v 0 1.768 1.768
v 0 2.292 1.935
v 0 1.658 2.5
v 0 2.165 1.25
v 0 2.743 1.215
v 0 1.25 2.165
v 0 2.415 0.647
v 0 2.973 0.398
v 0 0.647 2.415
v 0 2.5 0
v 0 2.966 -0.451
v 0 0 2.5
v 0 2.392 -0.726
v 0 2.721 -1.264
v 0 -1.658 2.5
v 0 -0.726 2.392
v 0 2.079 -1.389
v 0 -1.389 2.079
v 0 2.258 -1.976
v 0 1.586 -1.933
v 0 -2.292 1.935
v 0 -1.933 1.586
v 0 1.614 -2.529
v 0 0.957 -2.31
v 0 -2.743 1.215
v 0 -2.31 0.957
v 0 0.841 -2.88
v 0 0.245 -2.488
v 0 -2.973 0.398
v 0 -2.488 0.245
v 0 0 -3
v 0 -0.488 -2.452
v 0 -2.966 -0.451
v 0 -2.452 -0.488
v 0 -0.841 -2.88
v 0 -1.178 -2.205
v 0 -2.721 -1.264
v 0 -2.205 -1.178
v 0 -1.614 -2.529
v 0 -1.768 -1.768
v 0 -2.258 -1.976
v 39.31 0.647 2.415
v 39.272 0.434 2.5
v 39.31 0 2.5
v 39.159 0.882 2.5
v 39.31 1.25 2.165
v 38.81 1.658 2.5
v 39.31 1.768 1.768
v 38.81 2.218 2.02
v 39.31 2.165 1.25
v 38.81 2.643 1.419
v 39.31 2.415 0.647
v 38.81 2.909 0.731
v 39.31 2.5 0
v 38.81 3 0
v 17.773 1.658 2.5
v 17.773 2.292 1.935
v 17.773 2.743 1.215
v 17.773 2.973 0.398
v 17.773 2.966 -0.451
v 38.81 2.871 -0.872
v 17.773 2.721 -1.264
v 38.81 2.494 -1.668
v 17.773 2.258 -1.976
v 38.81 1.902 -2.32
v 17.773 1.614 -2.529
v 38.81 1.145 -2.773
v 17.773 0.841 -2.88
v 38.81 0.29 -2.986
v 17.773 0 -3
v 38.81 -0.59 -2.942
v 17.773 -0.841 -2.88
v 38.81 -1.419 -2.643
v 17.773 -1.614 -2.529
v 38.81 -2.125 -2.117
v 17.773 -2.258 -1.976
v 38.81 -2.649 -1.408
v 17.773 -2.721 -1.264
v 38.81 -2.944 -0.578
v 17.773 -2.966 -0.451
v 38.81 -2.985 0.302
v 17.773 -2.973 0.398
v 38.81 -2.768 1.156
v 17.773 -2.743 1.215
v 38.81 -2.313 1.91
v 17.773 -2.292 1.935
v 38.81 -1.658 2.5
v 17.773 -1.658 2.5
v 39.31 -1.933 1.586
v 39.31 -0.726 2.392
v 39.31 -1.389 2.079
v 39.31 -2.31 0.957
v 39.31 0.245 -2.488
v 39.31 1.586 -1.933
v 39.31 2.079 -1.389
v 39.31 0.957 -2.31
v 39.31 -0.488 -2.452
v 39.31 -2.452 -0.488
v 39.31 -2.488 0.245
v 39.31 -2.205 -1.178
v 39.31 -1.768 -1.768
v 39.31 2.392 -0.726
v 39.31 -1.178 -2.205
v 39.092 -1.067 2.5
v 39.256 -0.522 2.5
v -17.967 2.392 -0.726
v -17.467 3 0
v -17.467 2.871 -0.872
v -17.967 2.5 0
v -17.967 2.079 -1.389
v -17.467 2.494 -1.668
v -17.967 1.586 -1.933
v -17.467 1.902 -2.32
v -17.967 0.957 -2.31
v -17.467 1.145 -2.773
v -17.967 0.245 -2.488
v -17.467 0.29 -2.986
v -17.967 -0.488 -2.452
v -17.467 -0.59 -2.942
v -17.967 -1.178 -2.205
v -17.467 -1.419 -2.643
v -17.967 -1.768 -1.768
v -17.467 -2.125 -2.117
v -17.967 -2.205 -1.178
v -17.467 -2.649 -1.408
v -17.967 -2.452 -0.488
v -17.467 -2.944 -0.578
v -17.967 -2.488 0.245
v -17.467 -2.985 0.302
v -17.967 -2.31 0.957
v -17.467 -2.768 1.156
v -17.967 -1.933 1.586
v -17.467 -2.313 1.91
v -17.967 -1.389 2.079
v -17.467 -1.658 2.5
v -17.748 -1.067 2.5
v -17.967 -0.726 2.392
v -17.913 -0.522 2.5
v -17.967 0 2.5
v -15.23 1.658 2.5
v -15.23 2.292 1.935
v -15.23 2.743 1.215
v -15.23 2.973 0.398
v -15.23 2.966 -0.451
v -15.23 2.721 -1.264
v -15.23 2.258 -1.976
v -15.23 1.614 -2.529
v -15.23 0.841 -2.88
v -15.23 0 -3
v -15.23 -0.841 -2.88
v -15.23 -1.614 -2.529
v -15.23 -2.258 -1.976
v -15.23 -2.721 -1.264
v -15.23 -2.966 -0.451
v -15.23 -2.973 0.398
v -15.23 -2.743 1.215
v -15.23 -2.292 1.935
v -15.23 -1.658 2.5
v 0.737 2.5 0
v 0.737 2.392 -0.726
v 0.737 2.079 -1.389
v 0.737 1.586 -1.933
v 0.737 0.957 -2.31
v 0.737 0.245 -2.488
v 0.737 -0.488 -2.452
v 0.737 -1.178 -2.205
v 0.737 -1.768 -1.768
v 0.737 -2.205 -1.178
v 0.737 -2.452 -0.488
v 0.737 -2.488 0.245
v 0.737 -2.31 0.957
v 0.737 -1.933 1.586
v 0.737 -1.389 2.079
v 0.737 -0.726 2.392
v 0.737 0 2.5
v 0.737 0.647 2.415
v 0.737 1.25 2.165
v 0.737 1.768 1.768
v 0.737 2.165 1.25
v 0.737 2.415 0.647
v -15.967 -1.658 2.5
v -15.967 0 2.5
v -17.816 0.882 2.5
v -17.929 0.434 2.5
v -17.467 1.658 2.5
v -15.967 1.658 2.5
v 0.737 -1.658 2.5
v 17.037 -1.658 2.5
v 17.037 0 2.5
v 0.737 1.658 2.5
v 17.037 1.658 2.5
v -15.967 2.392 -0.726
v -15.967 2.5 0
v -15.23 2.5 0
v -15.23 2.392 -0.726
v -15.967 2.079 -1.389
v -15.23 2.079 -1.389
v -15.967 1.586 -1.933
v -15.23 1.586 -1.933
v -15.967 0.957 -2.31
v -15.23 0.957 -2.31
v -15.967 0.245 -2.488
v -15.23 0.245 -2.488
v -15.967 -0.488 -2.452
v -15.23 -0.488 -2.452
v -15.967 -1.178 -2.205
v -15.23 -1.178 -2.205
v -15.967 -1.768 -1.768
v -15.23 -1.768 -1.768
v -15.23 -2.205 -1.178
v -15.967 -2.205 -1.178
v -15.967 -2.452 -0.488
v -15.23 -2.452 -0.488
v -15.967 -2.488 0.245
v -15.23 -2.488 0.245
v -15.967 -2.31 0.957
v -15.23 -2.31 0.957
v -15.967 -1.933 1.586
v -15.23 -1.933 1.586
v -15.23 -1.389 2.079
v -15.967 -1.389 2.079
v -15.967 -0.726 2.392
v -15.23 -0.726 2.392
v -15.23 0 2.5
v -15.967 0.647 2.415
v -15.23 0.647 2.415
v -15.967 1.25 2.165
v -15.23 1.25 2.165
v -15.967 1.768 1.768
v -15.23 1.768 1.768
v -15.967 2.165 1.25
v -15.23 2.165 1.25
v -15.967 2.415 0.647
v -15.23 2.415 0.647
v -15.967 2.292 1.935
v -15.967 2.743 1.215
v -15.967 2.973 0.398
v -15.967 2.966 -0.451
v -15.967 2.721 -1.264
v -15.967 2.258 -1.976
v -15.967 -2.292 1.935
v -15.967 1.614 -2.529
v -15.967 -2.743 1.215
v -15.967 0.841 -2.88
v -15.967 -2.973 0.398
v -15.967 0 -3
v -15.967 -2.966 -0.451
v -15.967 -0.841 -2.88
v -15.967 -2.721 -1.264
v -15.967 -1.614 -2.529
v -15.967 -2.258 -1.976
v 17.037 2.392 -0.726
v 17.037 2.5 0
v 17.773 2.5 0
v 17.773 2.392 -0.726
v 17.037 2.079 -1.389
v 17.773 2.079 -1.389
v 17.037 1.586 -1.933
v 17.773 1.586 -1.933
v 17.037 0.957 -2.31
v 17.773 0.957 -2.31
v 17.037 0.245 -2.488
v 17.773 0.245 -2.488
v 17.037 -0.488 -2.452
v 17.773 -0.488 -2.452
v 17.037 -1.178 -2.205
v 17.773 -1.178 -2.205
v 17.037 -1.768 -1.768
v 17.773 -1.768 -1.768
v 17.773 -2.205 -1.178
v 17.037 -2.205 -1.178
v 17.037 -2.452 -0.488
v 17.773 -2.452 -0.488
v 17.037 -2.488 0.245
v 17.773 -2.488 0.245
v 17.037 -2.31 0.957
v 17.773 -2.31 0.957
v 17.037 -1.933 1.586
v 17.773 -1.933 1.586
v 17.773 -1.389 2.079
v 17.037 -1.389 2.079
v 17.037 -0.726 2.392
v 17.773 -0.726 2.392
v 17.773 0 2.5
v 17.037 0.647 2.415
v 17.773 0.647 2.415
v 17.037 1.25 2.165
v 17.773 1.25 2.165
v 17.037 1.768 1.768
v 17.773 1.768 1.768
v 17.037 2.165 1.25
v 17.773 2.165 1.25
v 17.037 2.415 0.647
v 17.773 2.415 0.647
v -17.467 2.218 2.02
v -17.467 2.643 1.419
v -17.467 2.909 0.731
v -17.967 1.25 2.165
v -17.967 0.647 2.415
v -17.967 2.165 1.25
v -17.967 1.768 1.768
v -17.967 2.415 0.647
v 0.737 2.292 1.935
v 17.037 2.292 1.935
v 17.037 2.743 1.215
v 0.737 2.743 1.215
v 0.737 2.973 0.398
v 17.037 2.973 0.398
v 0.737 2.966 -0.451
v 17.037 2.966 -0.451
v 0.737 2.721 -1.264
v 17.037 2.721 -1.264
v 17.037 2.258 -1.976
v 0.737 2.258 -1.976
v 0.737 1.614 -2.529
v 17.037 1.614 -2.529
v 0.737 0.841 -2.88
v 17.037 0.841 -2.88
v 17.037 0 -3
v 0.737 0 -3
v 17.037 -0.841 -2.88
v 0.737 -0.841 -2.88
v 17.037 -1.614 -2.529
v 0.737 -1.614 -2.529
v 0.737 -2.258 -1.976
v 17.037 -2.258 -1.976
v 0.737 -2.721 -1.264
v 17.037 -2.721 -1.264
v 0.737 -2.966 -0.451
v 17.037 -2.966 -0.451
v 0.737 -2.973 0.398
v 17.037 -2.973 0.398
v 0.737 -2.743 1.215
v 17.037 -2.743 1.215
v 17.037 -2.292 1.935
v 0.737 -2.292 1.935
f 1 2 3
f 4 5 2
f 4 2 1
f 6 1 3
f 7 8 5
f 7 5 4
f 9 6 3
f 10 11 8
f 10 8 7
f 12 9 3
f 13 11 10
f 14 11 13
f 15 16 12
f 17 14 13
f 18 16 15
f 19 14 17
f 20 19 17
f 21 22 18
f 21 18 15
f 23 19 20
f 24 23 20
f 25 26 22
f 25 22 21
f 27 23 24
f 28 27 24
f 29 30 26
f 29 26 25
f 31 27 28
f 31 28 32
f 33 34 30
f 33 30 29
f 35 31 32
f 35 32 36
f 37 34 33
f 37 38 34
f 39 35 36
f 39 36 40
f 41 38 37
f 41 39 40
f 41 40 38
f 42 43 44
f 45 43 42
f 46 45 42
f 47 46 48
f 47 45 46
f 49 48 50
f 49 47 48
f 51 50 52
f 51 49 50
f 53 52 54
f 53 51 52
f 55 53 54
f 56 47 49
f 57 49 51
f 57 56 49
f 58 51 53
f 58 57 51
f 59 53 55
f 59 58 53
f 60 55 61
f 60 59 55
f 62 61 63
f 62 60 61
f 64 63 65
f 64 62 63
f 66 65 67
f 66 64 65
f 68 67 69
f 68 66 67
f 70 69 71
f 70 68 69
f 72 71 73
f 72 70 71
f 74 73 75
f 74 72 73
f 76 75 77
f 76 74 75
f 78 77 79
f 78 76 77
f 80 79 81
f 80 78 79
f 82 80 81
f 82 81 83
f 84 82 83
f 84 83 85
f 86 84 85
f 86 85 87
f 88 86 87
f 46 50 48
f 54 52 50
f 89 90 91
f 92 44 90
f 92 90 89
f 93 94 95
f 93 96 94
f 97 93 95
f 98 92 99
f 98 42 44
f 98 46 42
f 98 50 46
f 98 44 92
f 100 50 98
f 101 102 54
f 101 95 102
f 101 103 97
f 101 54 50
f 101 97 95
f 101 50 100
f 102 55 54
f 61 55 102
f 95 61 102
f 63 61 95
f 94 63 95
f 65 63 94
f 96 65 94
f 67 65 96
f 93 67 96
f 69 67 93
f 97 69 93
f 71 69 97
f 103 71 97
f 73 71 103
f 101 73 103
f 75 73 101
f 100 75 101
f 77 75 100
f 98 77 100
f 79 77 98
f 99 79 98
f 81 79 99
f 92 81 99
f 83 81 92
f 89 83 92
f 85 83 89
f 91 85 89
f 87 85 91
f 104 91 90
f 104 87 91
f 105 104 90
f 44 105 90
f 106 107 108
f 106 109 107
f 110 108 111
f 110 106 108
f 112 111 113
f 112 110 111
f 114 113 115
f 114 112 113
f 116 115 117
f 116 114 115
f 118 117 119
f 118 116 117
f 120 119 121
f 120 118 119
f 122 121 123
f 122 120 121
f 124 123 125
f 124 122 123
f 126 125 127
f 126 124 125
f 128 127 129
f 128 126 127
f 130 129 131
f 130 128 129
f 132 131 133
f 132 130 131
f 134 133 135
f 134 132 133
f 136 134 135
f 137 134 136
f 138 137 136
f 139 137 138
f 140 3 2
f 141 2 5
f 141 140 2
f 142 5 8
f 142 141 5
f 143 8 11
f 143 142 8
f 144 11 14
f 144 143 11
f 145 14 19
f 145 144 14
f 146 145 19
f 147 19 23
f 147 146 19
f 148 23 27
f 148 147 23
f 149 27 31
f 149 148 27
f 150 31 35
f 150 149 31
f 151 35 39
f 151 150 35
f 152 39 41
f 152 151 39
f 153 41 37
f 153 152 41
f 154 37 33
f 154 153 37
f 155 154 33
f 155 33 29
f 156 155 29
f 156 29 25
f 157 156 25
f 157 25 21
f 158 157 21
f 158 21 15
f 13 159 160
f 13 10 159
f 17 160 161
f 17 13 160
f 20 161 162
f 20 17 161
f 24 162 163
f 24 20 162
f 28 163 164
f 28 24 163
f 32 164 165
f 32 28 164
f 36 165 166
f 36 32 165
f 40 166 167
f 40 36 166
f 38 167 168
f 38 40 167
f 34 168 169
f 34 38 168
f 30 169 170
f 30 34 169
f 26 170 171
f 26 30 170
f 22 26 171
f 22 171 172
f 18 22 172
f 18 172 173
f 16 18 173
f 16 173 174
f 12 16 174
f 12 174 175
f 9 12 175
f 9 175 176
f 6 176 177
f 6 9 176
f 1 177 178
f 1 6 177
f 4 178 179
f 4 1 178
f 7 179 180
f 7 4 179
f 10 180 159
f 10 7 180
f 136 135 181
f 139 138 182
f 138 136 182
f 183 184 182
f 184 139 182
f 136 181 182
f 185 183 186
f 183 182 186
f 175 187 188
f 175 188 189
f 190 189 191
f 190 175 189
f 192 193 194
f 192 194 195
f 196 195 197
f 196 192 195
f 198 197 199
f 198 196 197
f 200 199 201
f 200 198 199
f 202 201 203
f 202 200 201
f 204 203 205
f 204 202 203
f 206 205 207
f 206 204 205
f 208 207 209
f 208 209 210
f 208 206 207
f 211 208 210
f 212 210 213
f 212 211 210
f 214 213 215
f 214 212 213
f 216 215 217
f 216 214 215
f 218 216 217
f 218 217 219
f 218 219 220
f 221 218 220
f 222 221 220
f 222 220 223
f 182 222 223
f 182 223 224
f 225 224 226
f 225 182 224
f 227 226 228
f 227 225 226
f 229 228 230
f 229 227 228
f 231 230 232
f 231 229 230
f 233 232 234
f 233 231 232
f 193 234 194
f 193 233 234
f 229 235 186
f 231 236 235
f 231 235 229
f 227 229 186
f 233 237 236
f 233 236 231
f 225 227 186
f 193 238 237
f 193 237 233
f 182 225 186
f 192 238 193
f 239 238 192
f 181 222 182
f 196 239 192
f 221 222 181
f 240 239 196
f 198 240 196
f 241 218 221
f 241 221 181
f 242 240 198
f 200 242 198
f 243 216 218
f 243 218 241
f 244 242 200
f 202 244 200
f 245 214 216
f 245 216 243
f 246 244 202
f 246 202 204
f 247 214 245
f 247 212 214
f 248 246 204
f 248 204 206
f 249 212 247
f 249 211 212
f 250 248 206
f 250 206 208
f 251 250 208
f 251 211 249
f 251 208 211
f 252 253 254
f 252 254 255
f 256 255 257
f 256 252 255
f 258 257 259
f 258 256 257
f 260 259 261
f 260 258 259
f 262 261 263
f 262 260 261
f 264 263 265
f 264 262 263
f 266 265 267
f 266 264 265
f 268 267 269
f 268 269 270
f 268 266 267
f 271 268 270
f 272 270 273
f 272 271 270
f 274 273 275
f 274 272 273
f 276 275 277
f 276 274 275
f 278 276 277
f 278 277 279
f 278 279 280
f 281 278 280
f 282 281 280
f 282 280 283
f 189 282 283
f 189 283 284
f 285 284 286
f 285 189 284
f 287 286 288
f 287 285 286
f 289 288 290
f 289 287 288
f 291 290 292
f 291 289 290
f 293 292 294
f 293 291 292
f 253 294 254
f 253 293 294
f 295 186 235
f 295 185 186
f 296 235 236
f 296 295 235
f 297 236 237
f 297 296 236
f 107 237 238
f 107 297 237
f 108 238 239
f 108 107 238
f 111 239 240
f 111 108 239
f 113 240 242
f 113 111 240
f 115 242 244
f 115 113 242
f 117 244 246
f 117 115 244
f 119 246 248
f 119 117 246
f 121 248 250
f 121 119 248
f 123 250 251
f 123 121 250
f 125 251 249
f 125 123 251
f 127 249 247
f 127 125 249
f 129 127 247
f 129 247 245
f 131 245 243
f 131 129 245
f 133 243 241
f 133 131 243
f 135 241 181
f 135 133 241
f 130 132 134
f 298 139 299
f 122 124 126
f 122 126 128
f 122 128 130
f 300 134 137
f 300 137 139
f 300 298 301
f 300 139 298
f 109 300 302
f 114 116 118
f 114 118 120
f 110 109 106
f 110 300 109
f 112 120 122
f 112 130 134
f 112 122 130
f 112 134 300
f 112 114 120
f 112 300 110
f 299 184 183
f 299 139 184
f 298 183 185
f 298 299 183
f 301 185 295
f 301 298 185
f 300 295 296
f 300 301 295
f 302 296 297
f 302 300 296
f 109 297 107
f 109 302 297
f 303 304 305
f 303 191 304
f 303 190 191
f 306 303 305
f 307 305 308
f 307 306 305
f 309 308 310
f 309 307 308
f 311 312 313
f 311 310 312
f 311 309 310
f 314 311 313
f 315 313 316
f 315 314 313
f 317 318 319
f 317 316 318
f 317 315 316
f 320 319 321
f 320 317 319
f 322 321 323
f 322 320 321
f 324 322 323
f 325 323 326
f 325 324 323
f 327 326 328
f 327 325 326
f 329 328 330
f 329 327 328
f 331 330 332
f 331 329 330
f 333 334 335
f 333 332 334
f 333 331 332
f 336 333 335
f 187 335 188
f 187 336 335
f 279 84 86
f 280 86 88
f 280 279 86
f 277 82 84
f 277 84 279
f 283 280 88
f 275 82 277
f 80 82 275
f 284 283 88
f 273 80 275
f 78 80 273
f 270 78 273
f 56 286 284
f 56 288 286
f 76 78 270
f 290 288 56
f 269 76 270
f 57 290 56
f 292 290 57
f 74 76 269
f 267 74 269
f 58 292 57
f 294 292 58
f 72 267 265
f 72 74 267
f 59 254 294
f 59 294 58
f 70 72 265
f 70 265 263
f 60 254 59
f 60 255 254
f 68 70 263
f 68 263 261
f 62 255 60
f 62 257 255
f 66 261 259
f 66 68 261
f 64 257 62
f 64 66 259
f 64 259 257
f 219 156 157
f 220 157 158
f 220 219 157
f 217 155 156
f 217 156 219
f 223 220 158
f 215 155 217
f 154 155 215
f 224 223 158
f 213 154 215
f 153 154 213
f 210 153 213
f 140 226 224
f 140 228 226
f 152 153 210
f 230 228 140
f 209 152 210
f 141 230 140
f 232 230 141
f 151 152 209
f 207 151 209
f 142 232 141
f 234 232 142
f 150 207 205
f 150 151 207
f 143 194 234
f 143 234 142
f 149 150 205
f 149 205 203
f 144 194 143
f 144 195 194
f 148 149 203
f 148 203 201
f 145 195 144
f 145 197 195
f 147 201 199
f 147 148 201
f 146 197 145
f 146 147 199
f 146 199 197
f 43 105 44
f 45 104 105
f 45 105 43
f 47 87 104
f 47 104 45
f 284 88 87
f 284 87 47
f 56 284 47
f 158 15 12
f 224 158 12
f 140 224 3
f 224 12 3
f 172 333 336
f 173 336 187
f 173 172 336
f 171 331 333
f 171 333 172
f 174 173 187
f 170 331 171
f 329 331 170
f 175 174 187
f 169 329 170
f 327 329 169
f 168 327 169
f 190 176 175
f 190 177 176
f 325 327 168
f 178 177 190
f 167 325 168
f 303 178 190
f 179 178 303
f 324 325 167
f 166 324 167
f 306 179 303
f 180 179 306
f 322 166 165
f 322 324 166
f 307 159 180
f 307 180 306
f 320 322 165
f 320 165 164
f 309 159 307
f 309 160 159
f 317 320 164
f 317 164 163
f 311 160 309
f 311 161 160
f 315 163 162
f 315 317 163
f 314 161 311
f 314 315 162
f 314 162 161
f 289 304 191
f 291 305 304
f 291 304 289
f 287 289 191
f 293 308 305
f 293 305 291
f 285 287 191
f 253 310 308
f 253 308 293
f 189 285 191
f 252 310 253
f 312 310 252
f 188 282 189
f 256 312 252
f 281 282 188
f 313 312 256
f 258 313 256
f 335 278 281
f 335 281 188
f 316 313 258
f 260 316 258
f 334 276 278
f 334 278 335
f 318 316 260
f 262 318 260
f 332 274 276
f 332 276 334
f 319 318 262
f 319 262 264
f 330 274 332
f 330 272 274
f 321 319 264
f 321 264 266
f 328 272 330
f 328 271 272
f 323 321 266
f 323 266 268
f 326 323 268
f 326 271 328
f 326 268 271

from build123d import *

# Parameters (mm, degrees)
CHAMFER1_SIZE           = 0.5
CUT_EXTRUDE1_DEPTH      = 40.538087663
CUT_EXTRUDE1_DEPTH_BACK = 40.538087663
SKETCH2_W               = 2
SKETCH2_H               = 6


with BuildPart() as part:
    # Sketch1 → Revolve1 (revolve)
    with BuildSketch(Plane.XY):
        Polygon((-17.9666, 0), (39.3098, 0), (39.3098, 3), (37.3098, 3), (36.5732, 3), (17.7732, 3), (17.7732, 2.5), (17.0366, 2.5), (17.0366, 3), (0.7366, 3), (0.7366, 2.5), (0, 2.5), (0, 3), (-15.23, 3), (-15.23, 2.5), (-15.9666, 2.5), (-15.9666, 3), (-17.9666, 3), align=None)
    revolve(axis=Axis((-17.9666, 0, 0), (-1, 0, 0)))

    # Chamfer1
    chamfer1_edges = [part.edges().sort_by_distance(p)[0] for p in [
        (39.3098, -3, 0),
        (-17.9666, -3, 0),
    ]]
    chamfer(chamfer1_edges, length=CHAMFER1_SIZE)

    # Sketch2 → Cut-Extrude1 (cut, two sides: drawn at the far end of the back side and taken through both)
    with BuildSketch(Plane(origin=(0, 0, 0), x_dir=(0, 0, -1), z_dir=(1, 0, 0)).offset(-CUT_EXTRUDE1_DEPTH_BACK)):
        with Locations((-3.5, 0)):
            Rectangle(SKETCH2_W, SKETCH2_H)
    extrude(amount=CUT_EXTRUDE1_DEPTH + CUT_EXTRUDE1_DEPTH_BACK, mode=Mode.SUBTRACT)


solid = part.part
